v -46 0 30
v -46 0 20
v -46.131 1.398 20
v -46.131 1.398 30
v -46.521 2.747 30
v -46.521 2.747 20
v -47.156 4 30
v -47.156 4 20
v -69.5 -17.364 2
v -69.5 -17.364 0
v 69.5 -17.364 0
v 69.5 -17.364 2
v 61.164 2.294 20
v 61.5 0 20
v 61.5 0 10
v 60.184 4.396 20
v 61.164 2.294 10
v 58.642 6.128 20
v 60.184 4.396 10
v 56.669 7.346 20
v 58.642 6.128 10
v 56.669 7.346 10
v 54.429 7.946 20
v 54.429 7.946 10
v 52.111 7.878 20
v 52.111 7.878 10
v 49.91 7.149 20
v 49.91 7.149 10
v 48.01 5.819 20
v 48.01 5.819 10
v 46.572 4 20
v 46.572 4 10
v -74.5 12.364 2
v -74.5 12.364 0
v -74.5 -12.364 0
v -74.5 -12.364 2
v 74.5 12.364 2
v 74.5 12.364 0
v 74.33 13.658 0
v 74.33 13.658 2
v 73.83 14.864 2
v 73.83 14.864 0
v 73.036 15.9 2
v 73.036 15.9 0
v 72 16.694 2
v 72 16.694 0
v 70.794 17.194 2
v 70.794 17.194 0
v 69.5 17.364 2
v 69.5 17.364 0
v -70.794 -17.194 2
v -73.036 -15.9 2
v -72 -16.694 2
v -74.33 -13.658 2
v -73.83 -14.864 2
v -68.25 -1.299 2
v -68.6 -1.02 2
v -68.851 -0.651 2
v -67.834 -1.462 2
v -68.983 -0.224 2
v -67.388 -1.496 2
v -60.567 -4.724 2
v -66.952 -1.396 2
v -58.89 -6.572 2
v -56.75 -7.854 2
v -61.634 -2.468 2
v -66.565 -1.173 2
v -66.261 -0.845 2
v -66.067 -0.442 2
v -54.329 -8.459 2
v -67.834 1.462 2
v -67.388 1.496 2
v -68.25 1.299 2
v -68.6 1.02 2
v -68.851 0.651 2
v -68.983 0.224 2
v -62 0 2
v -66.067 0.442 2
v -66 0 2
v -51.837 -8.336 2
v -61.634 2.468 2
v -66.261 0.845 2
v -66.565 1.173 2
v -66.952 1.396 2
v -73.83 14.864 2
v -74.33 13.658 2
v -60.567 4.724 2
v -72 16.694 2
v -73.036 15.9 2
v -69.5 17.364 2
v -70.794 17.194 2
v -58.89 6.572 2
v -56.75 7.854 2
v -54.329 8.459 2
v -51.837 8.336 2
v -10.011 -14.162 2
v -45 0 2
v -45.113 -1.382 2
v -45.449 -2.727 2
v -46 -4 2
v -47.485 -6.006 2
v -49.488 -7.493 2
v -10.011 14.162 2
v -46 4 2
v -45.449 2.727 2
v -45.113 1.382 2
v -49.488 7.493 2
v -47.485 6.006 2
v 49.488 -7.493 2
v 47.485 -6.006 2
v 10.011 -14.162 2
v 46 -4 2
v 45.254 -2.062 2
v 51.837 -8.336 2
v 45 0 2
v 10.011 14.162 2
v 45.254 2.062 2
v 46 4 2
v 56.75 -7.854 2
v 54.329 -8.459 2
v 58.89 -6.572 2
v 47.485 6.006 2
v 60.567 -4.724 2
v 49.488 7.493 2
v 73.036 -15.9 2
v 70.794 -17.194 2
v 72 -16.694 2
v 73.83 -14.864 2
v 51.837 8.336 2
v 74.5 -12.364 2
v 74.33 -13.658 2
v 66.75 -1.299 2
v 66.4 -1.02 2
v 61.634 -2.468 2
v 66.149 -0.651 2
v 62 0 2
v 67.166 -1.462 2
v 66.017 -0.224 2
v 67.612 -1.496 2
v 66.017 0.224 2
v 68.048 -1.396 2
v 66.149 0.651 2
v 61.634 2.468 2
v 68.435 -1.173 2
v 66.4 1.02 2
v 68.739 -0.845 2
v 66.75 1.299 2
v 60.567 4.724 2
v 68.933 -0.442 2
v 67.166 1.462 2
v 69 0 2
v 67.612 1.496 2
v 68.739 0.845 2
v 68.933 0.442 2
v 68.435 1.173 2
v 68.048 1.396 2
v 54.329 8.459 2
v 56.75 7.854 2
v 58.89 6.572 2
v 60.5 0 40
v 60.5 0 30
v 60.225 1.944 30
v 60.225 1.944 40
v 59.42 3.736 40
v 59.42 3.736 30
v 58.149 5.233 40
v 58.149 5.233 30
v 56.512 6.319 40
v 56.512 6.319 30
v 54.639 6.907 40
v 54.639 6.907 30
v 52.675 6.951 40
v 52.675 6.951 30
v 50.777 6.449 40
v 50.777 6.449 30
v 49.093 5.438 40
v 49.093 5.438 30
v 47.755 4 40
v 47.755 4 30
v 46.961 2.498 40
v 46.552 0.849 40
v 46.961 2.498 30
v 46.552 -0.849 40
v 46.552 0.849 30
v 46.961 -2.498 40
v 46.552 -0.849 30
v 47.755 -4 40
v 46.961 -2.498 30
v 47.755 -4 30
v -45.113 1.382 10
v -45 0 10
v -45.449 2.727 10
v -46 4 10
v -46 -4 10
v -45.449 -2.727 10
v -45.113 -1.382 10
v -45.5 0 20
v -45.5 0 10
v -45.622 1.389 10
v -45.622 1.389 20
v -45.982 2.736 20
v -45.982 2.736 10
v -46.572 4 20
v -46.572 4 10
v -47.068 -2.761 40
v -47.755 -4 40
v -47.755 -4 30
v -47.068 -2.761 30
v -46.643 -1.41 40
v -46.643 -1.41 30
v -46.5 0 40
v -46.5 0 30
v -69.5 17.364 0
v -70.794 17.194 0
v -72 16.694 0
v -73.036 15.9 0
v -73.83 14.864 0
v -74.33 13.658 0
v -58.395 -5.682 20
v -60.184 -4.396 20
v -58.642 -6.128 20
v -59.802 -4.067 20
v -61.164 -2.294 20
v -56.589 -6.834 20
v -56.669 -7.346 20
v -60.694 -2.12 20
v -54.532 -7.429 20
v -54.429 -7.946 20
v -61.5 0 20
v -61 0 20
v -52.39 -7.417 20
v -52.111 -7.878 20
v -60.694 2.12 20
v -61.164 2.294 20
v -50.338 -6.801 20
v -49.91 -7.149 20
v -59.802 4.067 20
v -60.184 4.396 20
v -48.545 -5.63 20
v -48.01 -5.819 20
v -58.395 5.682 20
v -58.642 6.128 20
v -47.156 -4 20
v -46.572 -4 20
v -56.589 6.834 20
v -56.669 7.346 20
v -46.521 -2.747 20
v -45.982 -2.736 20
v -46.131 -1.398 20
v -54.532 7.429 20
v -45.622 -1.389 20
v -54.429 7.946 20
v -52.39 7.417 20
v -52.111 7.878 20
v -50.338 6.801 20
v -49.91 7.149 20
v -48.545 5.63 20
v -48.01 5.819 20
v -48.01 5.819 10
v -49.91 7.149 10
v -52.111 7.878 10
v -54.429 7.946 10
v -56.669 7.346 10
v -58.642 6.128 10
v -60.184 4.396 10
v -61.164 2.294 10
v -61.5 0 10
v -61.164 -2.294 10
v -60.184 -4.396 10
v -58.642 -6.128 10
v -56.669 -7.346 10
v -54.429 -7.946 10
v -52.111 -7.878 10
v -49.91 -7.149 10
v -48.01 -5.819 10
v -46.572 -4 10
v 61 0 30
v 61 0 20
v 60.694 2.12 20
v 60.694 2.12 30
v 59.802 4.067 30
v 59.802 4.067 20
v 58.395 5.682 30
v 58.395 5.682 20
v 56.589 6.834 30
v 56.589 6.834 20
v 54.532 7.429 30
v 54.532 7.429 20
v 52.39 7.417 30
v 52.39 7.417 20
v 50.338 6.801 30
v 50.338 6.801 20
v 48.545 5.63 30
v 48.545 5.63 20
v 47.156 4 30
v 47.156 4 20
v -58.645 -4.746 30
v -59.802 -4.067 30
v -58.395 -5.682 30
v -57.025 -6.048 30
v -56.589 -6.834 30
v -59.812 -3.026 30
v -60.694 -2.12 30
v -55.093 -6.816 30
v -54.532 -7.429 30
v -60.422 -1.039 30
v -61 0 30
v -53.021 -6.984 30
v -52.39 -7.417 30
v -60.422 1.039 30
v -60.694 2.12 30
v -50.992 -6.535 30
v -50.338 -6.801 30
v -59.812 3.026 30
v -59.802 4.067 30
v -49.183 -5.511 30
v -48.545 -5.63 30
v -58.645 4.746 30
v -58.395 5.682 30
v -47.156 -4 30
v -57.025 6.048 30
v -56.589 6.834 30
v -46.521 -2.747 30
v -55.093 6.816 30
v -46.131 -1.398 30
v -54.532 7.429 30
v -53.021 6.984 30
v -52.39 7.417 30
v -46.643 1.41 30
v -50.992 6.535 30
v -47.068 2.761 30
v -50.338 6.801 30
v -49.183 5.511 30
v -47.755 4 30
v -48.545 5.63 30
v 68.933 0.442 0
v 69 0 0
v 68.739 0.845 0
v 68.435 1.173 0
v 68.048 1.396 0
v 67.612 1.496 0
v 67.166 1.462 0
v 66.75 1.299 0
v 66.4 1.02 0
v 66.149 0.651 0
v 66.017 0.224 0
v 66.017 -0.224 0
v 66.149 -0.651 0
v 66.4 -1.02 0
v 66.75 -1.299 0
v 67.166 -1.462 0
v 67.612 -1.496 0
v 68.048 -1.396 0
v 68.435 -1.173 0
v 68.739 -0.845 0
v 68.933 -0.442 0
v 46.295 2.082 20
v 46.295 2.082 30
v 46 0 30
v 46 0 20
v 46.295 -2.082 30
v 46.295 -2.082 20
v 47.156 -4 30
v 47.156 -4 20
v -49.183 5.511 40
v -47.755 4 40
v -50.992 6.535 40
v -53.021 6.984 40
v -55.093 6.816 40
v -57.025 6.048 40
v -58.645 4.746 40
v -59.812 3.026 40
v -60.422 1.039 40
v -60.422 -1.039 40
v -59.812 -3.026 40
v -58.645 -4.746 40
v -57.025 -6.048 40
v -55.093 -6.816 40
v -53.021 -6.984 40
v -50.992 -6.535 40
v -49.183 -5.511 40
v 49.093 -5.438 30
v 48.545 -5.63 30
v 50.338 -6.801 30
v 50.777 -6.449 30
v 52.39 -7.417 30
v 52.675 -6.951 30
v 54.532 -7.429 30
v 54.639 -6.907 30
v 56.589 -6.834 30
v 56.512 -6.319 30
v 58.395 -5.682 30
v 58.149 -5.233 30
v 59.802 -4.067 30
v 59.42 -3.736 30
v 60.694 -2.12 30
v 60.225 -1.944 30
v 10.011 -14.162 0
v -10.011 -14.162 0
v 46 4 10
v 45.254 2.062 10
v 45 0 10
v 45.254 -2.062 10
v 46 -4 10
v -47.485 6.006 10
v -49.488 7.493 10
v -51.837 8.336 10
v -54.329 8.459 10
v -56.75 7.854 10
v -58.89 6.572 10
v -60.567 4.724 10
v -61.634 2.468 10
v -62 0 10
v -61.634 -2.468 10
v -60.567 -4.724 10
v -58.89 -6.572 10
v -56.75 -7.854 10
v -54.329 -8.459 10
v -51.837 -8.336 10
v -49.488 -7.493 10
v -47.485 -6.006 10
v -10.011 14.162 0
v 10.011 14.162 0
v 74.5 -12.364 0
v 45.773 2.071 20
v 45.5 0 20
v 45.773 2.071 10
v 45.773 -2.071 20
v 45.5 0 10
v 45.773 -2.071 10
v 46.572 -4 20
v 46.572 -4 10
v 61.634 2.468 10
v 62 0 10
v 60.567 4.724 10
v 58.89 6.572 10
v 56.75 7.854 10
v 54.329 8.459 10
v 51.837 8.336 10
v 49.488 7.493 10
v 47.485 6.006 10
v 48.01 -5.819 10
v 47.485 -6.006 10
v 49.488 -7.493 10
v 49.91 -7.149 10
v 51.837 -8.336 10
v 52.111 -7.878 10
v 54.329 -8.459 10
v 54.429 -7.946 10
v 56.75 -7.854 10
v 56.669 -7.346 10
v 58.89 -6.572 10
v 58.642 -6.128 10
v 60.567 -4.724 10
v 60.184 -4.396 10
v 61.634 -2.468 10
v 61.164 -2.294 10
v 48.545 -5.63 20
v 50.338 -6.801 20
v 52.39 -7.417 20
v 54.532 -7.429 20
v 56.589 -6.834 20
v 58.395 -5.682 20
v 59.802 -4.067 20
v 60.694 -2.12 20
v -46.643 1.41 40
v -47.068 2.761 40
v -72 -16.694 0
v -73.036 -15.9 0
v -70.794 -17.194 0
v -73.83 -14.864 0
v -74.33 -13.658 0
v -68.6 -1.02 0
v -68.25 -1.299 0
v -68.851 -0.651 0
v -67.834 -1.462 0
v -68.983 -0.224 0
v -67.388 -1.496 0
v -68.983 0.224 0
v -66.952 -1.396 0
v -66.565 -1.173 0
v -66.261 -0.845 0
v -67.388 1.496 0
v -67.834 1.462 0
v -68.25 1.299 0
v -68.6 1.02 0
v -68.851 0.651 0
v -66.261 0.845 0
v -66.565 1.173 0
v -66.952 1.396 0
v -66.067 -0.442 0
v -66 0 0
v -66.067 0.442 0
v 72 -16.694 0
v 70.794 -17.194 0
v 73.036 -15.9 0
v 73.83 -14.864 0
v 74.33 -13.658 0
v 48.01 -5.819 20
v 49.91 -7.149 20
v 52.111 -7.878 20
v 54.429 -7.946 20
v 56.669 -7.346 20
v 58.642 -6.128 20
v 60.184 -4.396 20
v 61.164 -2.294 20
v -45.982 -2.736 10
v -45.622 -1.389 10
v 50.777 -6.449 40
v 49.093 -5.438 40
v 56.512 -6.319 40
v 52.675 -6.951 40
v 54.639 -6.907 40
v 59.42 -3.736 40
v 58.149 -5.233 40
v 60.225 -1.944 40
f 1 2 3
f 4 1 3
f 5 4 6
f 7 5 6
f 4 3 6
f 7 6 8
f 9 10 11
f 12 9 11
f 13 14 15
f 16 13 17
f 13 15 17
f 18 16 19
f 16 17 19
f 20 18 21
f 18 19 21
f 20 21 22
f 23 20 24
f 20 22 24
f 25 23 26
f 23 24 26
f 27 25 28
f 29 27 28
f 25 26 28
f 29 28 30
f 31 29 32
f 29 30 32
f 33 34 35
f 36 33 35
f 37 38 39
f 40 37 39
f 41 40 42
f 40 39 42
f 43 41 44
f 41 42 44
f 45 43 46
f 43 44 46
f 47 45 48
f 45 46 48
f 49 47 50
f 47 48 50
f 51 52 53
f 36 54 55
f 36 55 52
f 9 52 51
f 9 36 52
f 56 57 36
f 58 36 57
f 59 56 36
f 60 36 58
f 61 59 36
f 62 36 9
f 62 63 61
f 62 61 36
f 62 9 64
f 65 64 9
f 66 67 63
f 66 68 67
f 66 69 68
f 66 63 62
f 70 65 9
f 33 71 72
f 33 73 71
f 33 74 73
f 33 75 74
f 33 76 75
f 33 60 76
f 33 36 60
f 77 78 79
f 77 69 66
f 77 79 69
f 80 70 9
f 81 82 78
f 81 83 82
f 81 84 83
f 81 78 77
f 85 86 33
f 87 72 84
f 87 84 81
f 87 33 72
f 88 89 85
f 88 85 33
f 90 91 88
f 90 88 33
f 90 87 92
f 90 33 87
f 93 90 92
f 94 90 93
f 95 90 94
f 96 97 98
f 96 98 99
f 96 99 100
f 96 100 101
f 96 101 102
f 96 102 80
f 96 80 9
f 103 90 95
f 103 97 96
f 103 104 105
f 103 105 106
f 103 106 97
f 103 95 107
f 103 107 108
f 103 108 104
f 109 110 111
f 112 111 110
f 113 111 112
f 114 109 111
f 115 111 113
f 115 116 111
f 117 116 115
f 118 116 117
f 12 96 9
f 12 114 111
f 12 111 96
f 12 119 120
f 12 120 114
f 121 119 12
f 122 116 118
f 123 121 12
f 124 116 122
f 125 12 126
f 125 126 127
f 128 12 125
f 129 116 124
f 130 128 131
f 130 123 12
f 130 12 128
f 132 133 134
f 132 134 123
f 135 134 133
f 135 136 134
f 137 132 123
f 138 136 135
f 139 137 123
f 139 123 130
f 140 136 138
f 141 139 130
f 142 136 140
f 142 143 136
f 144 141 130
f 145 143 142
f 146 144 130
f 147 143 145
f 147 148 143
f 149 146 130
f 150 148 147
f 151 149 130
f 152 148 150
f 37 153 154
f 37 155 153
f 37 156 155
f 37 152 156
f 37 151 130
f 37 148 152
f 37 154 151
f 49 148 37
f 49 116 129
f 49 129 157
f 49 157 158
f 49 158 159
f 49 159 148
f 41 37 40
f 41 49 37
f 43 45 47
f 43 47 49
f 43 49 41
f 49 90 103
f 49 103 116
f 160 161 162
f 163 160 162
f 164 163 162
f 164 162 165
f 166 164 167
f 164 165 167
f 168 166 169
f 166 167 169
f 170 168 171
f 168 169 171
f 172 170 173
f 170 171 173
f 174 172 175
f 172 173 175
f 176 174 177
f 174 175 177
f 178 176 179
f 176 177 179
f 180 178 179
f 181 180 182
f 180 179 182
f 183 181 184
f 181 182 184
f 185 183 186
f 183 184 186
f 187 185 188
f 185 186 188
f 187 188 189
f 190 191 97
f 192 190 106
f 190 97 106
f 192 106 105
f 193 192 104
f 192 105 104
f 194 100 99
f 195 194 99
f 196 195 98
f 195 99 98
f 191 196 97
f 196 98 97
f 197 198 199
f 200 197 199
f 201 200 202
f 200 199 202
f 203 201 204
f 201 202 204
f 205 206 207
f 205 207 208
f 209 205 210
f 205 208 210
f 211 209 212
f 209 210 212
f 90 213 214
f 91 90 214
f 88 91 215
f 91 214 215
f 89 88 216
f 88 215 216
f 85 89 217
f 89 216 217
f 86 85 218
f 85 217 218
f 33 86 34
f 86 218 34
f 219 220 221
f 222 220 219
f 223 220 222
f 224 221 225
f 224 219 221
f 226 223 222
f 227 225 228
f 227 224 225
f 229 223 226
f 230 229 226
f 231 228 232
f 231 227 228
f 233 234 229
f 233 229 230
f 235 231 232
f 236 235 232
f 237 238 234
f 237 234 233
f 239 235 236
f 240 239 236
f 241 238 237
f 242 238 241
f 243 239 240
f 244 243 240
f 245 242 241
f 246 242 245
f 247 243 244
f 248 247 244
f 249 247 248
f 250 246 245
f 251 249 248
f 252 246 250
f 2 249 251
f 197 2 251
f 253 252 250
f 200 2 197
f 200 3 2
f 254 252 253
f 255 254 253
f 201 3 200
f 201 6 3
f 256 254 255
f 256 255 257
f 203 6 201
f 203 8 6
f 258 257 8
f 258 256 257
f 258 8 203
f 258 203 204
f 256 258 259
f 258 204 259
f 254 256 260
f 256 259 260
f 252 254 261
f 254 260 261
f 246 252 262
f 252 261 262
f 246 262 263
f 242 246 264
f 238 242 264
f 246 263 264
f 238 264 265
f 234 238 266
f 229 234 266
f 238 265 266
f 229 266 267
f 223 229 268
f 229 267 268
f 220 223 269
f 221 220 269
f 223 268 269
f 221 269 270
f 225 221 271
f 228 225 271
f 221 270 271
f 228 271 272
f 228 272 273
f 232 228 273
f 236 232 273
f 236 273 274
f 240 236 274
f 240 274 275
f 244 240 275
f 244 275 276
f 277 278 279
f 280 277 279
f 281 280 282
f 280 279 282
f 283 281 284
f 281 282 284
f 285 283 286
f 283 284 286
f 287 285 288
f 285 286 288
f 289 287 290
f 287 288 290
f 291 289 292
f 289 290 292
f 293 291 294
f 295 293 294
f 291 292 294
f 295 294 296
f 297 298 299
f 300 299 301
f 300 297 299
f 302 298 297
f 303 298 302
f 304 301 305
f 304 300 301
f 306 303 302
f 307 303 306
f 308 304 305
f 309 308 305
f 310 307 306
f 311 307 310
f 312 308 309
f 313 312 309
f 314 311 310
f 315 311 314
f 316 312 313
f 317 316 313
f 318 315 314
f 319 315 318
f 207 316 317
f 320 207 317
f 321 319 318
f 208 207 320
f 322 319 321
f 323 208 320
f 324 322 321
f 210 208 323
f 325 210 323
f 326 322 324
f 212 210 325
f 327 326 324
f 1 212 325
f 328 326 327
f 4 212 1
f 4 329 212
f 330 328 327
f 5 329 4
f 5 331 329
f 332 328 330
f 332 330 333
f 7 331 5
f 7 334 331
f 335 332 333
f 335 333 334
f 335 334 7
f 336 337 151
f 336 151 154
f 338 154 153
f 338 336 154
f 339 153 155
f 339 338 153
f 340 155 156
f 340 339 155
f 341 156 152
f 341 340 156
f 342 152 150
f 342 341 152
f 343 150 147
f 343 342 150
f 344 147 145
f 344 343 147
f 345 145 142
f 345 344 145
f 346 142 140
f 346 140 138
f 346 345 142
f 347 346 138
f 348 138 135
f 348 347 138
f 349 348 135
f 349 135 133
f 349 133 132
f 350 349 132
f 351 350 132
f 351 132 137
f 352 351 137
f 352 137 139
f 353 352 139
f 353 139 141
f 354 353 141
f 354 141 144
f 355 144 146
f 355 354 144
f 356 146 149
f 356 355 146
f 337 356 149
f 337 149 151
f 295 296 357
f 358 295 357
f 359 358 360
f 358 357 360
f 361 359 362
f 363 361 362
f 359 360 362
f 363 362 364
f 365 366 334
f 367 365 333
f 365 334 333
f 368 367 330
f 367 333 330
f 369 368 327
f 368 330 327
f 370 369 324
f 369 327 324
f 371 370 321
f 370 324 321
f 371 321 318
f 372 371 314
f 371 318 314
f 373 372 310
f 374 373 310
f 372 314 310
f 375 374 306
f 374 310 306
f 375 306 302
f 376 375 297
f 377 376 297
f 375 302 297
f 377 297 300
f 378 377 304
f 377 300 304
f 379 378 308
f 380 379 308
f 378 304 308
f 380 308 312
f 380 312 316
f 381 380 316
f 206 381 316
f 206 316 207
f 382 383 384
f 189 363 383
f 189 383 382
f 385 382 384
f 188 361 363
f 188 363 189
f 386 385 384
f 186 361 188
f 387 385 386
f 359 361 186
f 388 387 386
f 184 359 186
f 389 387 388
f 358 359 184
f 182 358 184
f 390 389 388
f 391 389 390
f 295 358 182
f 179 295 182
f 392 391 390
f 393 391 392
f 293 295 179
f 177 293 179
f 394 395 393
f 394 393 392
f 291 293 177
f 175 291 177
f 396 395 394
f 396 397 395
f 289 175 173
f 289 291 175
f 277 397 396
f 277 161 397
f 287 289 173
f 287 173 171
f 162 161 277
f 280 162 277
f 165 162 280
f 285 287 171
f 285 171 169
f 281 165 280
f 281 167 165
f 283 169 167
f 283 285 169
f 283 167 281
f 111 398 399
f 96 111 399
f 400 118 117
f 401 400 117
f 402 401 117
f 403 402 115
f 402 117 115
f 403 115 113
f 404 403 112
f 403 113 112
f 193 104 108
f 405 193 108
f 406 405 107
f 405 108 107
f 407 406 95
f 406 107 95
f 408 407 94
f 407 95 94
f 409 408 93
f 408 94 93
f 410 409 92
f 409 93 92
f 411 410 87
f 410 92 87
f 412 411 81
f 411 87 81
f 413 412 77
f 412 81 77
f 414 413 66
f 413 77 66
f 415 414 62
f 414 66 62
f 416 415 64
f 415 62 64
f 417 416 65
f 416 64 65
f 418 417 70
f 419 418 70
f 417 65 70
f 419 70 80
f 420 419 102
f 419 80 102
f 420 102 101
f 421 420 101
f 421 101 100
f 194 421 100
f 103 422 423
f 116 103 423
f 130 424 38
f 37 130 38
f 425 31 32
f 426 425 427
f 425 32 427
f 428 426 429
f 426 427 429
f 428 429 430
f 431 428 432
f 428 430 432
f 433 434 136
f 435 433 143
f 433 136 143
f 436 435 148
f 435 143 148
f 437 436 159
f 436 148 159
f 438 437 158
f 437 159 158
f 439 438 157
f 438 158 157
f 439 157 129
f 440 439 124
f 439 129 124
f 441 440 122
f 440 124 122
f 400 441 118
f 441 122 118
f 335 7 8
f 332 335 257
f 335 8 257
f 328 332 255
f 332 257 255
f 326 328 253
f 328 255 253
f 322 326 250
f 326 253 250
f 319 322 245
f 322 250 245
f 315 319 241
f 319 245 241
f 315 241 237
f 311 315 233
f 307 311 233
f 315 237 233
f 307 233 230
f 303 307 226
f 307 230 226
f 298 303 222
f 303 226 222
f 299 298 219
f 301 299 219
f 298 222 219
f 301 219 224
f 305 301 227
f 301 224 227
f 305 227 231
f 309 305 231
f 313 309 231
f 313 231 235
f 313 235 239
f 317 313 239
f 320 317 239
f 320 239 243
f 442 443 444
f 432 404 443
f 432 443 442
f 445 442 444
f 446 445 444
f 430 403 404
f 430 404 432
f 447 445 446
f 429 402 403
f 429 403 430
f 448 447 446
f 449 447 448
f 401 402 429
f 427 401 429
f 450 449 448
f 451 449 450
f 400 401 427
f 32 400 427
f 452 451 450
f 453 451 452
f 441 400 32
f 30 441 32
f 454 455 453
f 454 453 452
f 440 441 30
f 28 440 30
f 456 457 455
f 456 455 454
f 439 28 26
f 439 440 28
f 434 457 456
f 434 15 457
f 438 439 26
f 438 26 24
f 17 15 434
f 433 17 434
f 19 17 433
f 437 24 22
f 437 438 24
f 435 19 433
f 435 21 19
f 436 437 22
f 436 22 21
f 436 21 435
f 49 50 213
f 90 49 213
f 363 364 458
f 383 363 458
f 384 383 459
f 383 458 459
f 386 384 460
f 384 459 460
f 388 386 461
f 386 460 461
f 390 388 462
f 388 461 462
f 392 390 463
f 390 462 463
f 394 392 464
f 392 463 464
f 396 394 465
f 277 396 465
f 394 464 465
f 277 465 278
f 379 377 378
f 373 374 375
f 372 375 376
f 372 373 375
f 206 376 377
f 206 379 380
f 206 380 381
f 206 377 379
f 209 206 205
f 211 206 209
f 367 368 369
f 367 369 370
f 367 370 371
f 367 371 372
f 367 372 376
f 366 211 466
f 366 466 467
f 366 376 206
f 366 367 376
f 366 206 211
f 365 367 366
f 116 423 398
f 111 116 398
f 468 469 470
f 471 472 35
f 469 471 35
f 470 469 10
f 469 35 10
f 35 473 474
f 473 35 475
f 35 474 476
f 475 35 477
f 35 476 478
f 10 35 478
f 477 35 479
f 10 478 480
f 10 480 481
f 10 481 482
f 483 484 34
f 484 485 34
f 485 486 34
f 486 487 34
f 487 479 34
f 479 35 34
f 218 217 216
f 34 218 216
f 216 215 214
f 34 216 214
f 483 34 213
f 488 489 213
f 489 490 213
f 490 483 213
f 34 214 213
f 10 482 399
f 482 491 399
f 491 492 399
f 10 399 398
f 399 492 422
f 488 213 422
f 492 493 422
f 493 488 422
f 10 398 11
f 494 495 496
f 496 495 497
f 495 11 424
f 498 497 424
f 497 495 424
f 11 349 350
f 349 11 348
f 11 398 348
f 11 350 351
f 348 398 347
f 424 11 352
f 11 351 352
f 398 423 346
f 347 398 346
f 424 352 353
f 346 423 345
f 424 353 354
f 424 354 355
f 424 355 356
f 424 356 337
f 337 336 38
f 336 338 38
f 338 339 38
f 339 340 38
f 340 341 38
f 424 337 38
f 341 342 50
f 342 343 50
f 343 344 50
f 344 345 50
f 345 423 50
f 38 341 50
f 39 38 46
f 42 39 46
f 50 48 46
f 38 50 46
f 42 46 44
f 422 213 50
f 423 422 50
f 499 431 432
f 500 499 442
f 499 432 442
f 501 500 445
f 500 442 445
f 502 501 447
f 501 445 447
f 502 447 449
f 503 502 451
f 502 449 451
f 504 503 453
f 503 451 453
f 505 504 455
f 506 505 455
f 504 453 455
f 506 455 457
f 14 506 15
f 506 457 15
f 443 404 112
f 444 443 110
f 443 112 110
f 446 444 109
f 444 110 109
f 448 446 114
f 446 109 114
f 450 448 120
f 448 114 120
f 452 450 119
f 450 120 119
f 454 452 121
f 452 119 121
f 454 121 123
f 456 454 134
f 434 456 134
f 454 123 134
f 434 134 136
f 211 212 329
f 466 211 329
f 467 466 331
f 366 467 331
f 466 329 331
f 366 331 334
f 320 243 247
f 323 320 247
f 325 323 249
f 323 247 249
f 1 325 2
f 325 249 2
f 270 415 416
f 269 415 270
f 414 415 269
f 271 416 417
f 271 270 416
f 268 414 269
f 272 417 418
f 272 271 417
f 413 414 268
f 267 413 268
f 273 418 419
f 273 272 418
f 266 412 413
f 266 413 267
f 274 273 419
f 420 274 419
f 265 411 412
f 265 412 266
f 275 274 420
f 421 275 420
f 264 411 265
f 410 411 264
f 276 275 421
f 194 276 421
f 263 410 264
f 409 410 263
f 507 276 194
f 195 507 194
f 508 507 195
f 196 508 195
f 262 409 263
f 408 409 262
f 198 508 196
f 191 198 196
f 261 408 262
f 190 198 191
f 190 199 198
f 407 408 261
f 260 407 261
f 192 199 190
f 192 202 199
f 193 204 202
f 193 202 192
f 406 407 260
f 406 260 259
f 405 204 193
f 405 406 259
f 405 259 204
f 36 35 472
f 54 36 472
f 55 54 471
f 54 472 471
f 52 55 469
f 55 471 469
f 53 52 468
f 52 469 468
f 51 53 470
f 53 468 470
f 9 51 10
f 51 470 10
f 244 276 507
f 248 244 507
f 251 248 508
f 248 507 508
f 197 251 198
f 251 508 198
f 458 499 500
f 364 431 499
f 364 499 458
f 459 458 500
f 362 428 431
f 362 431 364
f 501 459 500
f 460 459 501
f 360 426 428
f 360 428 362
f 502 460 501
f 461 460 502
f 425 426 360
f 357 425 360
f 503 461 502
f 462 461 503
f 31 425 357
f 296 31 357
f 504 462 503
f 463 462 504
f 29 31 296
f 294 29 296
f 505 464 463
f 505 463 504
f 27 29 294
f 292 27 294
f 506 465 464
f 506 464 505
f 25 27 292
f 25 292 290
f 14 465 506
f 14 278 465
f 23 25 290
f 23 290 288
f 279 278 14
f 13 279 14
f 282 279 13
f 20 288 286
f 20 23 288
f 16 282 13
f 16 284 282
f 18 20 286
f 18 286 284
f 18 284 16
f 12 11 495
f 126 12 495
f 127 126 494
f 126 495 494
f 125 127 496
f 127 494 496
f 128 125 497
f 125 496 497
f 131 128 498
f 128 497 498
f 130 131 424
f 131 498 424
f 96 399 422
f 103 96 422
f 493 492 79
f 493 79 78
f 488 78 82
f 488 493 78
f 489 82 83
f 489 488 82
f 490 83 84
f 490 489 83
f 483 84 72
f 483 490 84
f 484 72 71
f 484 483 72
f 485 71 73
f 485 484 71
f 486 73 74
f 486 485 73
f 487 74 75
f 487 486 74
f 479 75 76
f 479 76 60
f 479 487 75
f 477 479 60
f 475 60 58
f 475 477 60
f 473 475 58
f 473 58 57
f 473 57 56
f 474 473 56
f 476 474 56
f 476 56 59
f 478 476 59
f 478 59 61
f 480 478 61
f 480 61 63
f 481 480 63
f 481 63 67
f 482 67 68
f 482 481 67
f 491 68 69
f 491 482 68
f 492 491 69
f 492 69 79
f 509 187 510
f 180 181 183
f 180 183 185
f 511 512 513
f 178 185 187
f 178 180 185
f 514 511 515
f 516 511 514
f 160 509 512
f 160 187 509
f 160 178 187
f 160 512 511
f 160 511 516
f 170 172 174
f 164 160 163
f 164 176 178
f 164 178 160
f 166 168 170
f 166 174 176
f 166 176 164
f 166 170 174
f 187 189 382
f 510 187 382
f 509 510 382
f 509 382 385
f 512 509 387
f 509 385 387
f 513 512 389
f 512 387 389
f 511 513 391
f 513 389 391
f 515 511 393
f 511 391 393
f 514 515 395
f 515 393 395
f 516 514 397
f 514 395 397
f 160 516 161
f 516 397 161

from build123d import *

# Parameters (mm, degrees)
F0_R     = 1.5
F1_DEPTH = 2
F2_DEPTH = 40
F3_DEPTH = 30
F4_DEPTH = 20
F5_DEPTH = 10


with BuildPart() as f1:
    # F0 (on Top) → F1 (new body)
    with BuildSketch(Plane.XY):
        with BuildLine():
            Line((69.5, 17.3640065603), (-69.5, 17.3640065603))
            ThreePointArc((-69.5, 17.3640065603), (-73.0355339059, 15.8995404662), (-74.5, 12.3640065603))
            Line((-74.5, 12.3640065603), (-74.5, -12.3640065603))
            ThreePointArc((-74.5, -12.3640065603), (-73.0355339059, -15.8995404662), (-69.5, -17.3640065603))
            Line((-69.5, -17.3640065603), (69.5, -17.3640065603))
            ThreePointArc((69.5, -17.3640065603), (73.0355339059, -15.8995404662), (74.5, -12.3640065603))
            Line((74.5, -12.3640065603), (74.5, 12.3640065603))
            ThreePointArc((74.5, 12.3640065603), (73.0355339059, 15.8995404662), (69.5, 17.3640065603))
        make_face()
        with Locations((-67.5, 0)):
            Circle(F0_R, mode=Mode.SUBTRACT)
        with BuildLine():
            ThreePointArc((-46, -4), (-62, 0), (-46, 4))
            Line((-46, 4), (-10.0108450279, 4))
            Line((-10.0108450279, 4), (-10.0108450279, 14.1616659239))
            Line((-10.0108450279, 14.1616659239), (10.0108450279, 14.1616659239))
            Line((10.0108450279, 14.1616659239), (10.0108450279, 4))
            Line((10.0108450279, 4), (46, 4))
            ThreePointArc((46, 4), (55.5615528128, 8.2462112512), (62, 0))
            ThreePointArc((62, 0), (55.5615528128, -8.2462112512), (46, -4))
            Line((46, -4), (10.0108450279, -4))
            Line((10.0108450279, -4), (10.0108450279, -14.1616659239))
            Line((10.0108450279, -14.1616659239), (-10.0108450279, -14.1616659239))
            Line((-10.0108450279, -14.1616659239), (-10.0108450279, -4))
            Line((-10.0108450279, -4), (-46, -4))
        make_face(mode=Mode.SUBTRACT)
        with Locations((67.5, 0)):
            Circle(F0_R, mode=Mode.SUBTRACT)
        with BuildLine():
            Line((-10.0108450279, 4), (-46, 4))
            ThreePointArc((-46, 4), (-45.2537887488, 2.0615528128), (-45, 0))
            ThreePointArc((-45, 0), (-45.2537887488, -2.0615528128), (-46, -4))
            Line((-46, -4), (-10.0108450279, -4))
            Line((-10.0108450279, -4), (-10.0108450279, 4))
        make_face()
        with BuildLine():
            Line((46, 4), (10.0108450279, 4))
            Line((10.0108450279, 4), (10.0108450279, -4))
            Line((10.0108450279, -4), (46, -4))
            ThreePointArc((46, -4), (45, 0), (46, 4))
        make_face()
        with BuildLine():
            ThreePointArc((-47.7554373535, -4), (-46.8212299588, -2.0961943462), (-46.5, 0))
            ThreePointArc((-46.5, 0), (-46.8212299588, 2.0961943462), (-47.7554373535, 4))
            Line((-47.7554373535, 4), (-53.5, 4))
            Line((-53.5, 4), (-53.5, -4))
            Line((-53.5, -4), (-47.7554373535, -4))
        make_face()
        with BuildLine():
            Line((-53.5, 4), (-47.7554373535, 4))
            ThreePointArc((-47.7554373535, 4), (-60.5, 0), (-47.7554373535, -4))
            Line((-47.7554373535, -4), (-53.5, -4))
            Line((-53.5, -4), (-53.5, 4))
        make_face()
        with BuildLine():
            ThreePointArc((-47.7554373535, -4), (-60.5, 0), (-47.7554373535, 4))
            Line((-47.7554373535, 4), (-47.1557112298, 4))
            ThreePointArc((-47.1557112298, 4), (-61, 0), (-47.1557112298, -4))
            Line((-47.1557112298, -4), (-47.7554373535, -4))
        make_face()
        with BuildLine():
            ThreePointArc((-47.1557112298, -4), (-61, 0), (-47.1557112298, 4))
            Line((-47.1557112298, 4), (-46.5717967697, 4))
            ThreePointArc((-46.5717967697, 4), (-61.5, 0), (-46.5717967697, -4))
            Line((-46.5717967697, -4), (-47.1557112298, -4))
        make_face()
        with BuildLine():
            ThreePointArc((-46.5717967697, -4), (-61.5, 0), (-46.5717967697, 4))
            Line((-46.5717967697, 4), (-46, 4))
            ThreePointArc((-46, 4), (-62, 0), (-46, -4))
            Line((-46, -4), (-46.5717967697, -4))
        make_face()
        with BuildLine():
            ThreePointArc((-47.7554373535, 4), (-46.8212299588, 2.0961943462), (-46.5, 0))
            ThreePointArc((-46.5, 0), (-46.8212299588, -2.0961943462), (-47.7554373535, -4))
            Line((-47.7554373535, -4), (-47.1557112298, -4))
            ThreePointArc((-47.1557112298, -4), (-46.2947184033, -2.0818062138), (-46, 0))
            ThreePointArc((-46, 0), (-46.2947184033, 2.0818062138), (-47.1557112298, 4))
            Line((-47.1557112298, 4), (-47.7554373535, 4))
        make_face()
        with BuildLine():
            Line((-46.5717967697, 4), (-47.1557112298, 4))
            ThreePointArc((-47.1557112298, 4), (-46.2947184033, 2.0818062138), (-46, 0))
            ThreePointArc((-46, 0), (-46.2947184033, -2.0818062138), (-47.1557112298, -4))
            Line((-47.1557112298, -4), (-46.5717967697, -4))
            ThreePointArc((-46.5717967697, -4), (-45.7725933897, -2.0705523608), (-45.5, 0))
            ThreePointArc((-45.5, 0), (-45.7725933897, 2.0705523608), (-46.5717967697, 4))
        make_face()
        with BuildLine():
            Line((-46, 4), (-46.5717967697, 4))
            ThreePointArc((-46.5717967697, 4), (-45.7725933897, 2.0705523608), (-45.5, 0))
            ThreePointArc((-45.5, 0), (-45.7725933897, -2.0705523608), (-46.5717967697, -4))
            Line((-46.5717967697, -4), (-46, -4))
            ThreePointArc((-46, -4), (-45.2537887488, -2.0615528128), (-45, 0))
            ThreePointArc((-45, 0), (-45.2537887488, 2.0615528128), (-46, 4))
        make_face()
        with BuildLine():
            ThreePointArc((60.5, 0), (55.5961943462, 6.6787700412), (47.7554373535, 4))
            Line((47.7554373535, 4), (53.5, 4))
            Line((53.5, 4), (53.5, -4))
            Line((53.5, -4), (47.7554373535, -4))
            ThreePointArc((47.7554373535, -4), (55.5961943462, -6.6787700412), (60.5, 0))
        make_face()
        with BuildLine():
            Line((53.5, 4), (47.7554373535, 4))
            ThreePointArc((47.7554373535, 4), (46.5, 0), (47.7554373535, -4))
            Line((47.7554373535, -4), (53.5, -4))
            Line((53.5, -4), (53.5, 4))
        make_face()
        with BuildLine():
            Line((47.7554373535, 4), (47.1557112298, 4))
            ThreePointArc((47.1557112298, 4), (46, 0), (47.1557112298, -4))
            Line((47.1557112298, -4), (47.7554373535, -4))
            ThreePointArc((47.7554373535, -4), (46.5, 0), (47.7554373535, 4))
        make_face()
        with BuildLine():
            Line((47.1557112298, 4), (46.5717967697, 4))
            ThreePointArc((46.5717967697, 4), (45.5, 0), (46.5717967697, -4))
            Line((46.5717967697, -4), (47.1557112298, -4))
            ThreePointArc((47.1557112298, -4), (46, 0), (47.1557112298, 4))
        make_face()
        with BuildLine():
            Line((46.5717967697, 4), (46, 4))
            ThreePointArc((46, 4), (45, 0), (46, -4))
            Line((46, -4), (46.5717967697, -4))
            ThreePointArc((46.5717967697, -4), (45.5, 0), (46.5717967697, 4))
        make_face()
        with BuildLine():
            ThreePointArc((62, 0), (55.5615528128, 8.2462112512), (46, 4))
            Line((46, 4), (46.5717967697, 4))
            ThreePointArc((46.5717967697, 4), (55.5705523608, 7.7274066103), (61.5, 0))
            ThreePointArc((61.5, 0), (55.5705523608, -7.7274066103), (46.5717967697, -4))
            Line((46.5717967697, -4), (46, -4))
            ThreePointArc((46, -4), (55.5615528128, -8.2462112512), (62, 0))
        make_face()
        with BuildLine():
            ThreePointArc((61.5, 0), (55.5705523608, 7.7274066103), (46.5717967697, 4))
            Line((46.5717967697, 4), (47.1557112298, 4))
            ThreePointArc((47.1557112298, 4), (55.5818062138, 7.2052815967), (61, 0))
            ThreePointArc((61, 0), (55.5818062138, -7.2052815967), (47.1557112298, -4))
            Line((47.1557112298, -4), (46.5717967697, -4))
            ThreePointArc((46.5717967697, -4), (55.5705523608, -7.7274066103), (61.5, 0))
        make_face()
        with BuildLine():
            ThreePointArc((61, 0), (55.5818062138, 7.2052815967), (47.1557112298, 4))
            Line((47.1557112298, 4), (47.7554373535, 4))
            ThreePointArc((47.7554373535, 4), (55.5961943462, 6.6787700412), (60.5, 0))
            ThreePointArc((60.5, 0), (55.5961943462, -6.6787700412), (47.7554373535, -4))
            Line((47.7554373535, -4), (47.1557112298, -4))
            ThreePointArc((47.1557112298, -4), (55.5818062138, -7.2052815967), (61, 0))
        make_face()
    extrude(amount=F1_DEPTH)

    # F0 (on Top) → F2 (join)
    with BuildSketch(Plane.XY):
        with BuildLine():
            Line((-53.5, 4), (-47.7554373535, 4))
            ThreePointArc((-47.7554373535, 4), (-60.5, 0), (-47.7554373535, -4))
            Line((-47.7554373535, -4), (-53.5, -4))
            Line((-53.5, -4), (-53.5, 4))
        make_face()
        with BuildLine():
            ThreePointArc((-47.7554373535, -4), (-46.8212299588, -2.0961943462), (-46.5, 0))
            ThreePointArc((-46.5, 0), (-46.8212299588, 2.0961943462), (-47.7554373535, 4))
            Line((-47.7554373535, 4), (-53.5, 4))
            Line((-53.5, 4), (-53.5, -4))
            Line((-53.5, -4), (-47.7554373535, -4))
        make_face()
        with BuildLine():
            Line((53.5, 4), (47.7554373535, 4))
            ThreePointArc((47.7554373535, 4), (46.5, 0), (47.7554373535, -4))
            Line((47.7554373535, -4), (53.5, -4))
            Line((53.5, -4), (53.5, 4))
        make_face()
        with BuildLine():
            ThreePointArc((60.5, 0), (55.5961943462, 6.6787700412), (47.7554373535, 4))
            Line((47.7554373535, 4), (53.5, 4))
            Line((53.5, 4), (53.5, -4))
            Line((53.5, -4), (47.7554373535, -4))
            ThreePointArc((47.7554373535, -4), (55.5961943462, -6.6787700412), (60.5, 0))
        make_face()
    extrude(amount=F2_DEPTH)

    # F0 (on Top) → F3 (join)
    with BuildSketch(Plane.XY):
        with BuildLine():
            ThreePointArc((-47.7554373535, -4), (-60.5, 0), (-47.7554373535, 4))
            Line((-47.7554373535, 4), (-47.1557112298, 4))
            ThreePointArc((-47.1557112298, 4), (-61, 0), (-47.1557112298, -4))
            Line((-47.1557112298, -4), (-47.7554373535, -4))
        make_face()
        with BuildLine():
            ThreePointArc((-47.7554373535, 4), (-46.8212299588, 2.0961943462), (-46.5, 0))
            ThreePointArc((-46.5, 0), (-46.8212299588, -2.0961943462), (-47.7554373535, -4))
            Line((-47.7554373535, -4), (-47.1557112298, -4))
            ThreePointArc((-47.1557112298, -4), (-46.2947184033, -2.0818062138), (-46, 0))
            ThreePointArc((-46, 0), (-46.2947184033, 2.0818062138), (-47.1557112298, 4))
            Line((-47.1557112298, 4), (-47.7554373535, 4))
        make_face()
        with BuildLine():
            Line((47.7554373535, 4), (47.1557112298, 4))
            ThreePointArc((47.1557112298, 4), (46, 0), (47.1557112298, -4))
            Line((47.1557112298, -4), (47.7554373535, -4))
            ThreePointArc((47.7554373535, -4), (46.5, 0), (47.7554373535, 4))
        make_face()
        with BuildLine():
            ThreePointArc((61, 0), (55.5818062138, 7.2052815967), (47.1557112298, 4))
            Line((47.1557112298, 4), (47.7554373535, 4))
            ThreePointArc((47.7554373535, 4), (55.5961943462, 6.6787700412), (60.5, 0))
            ThreePointArc((60.5, 0), (55.5961943462, -6.6787700412), (47.7554373535, -4))
            Line((47.7554373535, -4), (47.1557112298, -4))
            ThreePointArc((47.1557112298, -4), (55.5818062138, -7.2052815967), (61, 0))
        make_face()
    extrude(amount=F3_DEPTH)

    # F0 (on Top) → F4 (join)
    with BuildSketch(Plane.XY):
        with BuildLine():
            ThreePointArc((-47.1557112298, -4), (-61, 0), (-47.1557112298, 4))
            Line((-47.1557112298, 4), (-46.5717967697, 4))
            ThreePointArc((-46.5717967697, 4), (-61.5, 0), (-46.5717967697, -4))
            Line((-46.5717967697, -4), (-47.1557112298, -4))
        make_face()
        with BuildLine():
            Line((-46.5717967697, 4), (-47.1557112298, 4))
            ThreePointArc((-47.1557112298, 4), (-46.2947184033, 2.0818062138), (-46, 0))
            ThreePointArc((-46, 0), (-46.2947184033, -2.0818062138), (-47.1557112298, -4))
            Line((-47.1557112298, -4), (-46.5717967697, -4))
            ThreePointArc((-46.5717967697, -4), (-45.7725933897, -2.0705523608), (-45.5, 0))
            ThreePointArc((-45.5, 0), (-45.7725933897, 2.0705523608), (-46.5717967697, 4))
        make_face()
        with BuildLine():
            Line((47.1557112298, 4), (46.5717967697, 4))
            ThreePointArc((46.5717967697, 4), (45.5, 0), (46.5717967697, -4))
            Line((46.5717967697, -4), (47.1557112298, -4))
            ThreePointArc((47.1557112298, -4), (46, 0), (47.1557112298, 4))
        make_face()
        with BuildLine():
            ThreePointArc((61.5, 0), (55.5705523608, 7.7274066103), (46.5717967697, 4))
            Line((46.5717967697, 4), (47.1557112298, 4))
            ThreePointArc((47.1557112298, 4), (55.5818062138, 7.2052815967), (61, 0))
            ThreePointArc((61, 0), (55.5818062138, -7.2052815967), (47.1557112298, -4))
            Line((47.1557112298, -4), (46.5717967697, -4))
            ThreePointArc((46.5717967697, -4), (55.5705523608, -7.7274066103), (61.5, 0))
        make_face()
    extrude(amount=F4_DEPTH)

    # F0 (on Top) → F5 (join)
    with BuildSketch(Plane.XY):
        with BuildLine():
            Line((46.5717967697, 4), (46, 4))
            ThreePointArc((46, 4), (45, 0), (46, -4))
            Line((46, -4), (46.5717967697, -4))
            ThreePointArc((46.5717967697, -4), (45.5, 0), (46.5717967697, 4))
        make_face()
        with BuildLine():
            ThreePointArc((62, 0), (55.5615528128, 8.2462112512), (46, 4))
            Line((46, 4), (46.5717967697, 4))
            ThreePointArc((46.5717967697, 4), (55.5705523608, 7.7274066103), (61.5, 0))
            ThreePointArc((61.5, 0), (55.5705523608, -7.7274066103), (46.5717967697, -4))
            Line((46.5717967697, -4), (46, -4))
            ThreePointArc((46, -4), (55.5615528128, -8.2462112512), (62, 0))
        make_face()
        with BuildLine():
            Line((-46, 4), (-46.5717967697, 4))
            ThreePointArc((-46.5717967697, 4), (-45.7725933897, 2.0705523608), (-45.5, 0))
            ThreePointArc((-45.5, 0), (-45.7725933897, -2.0705523608), (-46.5717967697, -4))
            Line((-46.5717967697, -4), (-46, -4))
            ThreePointArc((-46, -4), (-45.2537887488, -2.0615528128), (-45, 0))
            ThreePointArc((-45, 0), (-45.2537887488, 2.0615528128), (-46, 4))
        make_face()
        with BuildLine():
            ThreePointArc((-46.5717967697, -4), (-61.5, 0), (-46.5717967697, 4))
            Line((-46.5717967697, 4), (-46, 4))
            ThreePointArc((-46, 4), (-62, 0), (-46, -4))
            Line((-46, -4), (-46.5717967697, -4))
        make_face()
    extrude(amount=F5_DEPTH)


solid = f1.part
